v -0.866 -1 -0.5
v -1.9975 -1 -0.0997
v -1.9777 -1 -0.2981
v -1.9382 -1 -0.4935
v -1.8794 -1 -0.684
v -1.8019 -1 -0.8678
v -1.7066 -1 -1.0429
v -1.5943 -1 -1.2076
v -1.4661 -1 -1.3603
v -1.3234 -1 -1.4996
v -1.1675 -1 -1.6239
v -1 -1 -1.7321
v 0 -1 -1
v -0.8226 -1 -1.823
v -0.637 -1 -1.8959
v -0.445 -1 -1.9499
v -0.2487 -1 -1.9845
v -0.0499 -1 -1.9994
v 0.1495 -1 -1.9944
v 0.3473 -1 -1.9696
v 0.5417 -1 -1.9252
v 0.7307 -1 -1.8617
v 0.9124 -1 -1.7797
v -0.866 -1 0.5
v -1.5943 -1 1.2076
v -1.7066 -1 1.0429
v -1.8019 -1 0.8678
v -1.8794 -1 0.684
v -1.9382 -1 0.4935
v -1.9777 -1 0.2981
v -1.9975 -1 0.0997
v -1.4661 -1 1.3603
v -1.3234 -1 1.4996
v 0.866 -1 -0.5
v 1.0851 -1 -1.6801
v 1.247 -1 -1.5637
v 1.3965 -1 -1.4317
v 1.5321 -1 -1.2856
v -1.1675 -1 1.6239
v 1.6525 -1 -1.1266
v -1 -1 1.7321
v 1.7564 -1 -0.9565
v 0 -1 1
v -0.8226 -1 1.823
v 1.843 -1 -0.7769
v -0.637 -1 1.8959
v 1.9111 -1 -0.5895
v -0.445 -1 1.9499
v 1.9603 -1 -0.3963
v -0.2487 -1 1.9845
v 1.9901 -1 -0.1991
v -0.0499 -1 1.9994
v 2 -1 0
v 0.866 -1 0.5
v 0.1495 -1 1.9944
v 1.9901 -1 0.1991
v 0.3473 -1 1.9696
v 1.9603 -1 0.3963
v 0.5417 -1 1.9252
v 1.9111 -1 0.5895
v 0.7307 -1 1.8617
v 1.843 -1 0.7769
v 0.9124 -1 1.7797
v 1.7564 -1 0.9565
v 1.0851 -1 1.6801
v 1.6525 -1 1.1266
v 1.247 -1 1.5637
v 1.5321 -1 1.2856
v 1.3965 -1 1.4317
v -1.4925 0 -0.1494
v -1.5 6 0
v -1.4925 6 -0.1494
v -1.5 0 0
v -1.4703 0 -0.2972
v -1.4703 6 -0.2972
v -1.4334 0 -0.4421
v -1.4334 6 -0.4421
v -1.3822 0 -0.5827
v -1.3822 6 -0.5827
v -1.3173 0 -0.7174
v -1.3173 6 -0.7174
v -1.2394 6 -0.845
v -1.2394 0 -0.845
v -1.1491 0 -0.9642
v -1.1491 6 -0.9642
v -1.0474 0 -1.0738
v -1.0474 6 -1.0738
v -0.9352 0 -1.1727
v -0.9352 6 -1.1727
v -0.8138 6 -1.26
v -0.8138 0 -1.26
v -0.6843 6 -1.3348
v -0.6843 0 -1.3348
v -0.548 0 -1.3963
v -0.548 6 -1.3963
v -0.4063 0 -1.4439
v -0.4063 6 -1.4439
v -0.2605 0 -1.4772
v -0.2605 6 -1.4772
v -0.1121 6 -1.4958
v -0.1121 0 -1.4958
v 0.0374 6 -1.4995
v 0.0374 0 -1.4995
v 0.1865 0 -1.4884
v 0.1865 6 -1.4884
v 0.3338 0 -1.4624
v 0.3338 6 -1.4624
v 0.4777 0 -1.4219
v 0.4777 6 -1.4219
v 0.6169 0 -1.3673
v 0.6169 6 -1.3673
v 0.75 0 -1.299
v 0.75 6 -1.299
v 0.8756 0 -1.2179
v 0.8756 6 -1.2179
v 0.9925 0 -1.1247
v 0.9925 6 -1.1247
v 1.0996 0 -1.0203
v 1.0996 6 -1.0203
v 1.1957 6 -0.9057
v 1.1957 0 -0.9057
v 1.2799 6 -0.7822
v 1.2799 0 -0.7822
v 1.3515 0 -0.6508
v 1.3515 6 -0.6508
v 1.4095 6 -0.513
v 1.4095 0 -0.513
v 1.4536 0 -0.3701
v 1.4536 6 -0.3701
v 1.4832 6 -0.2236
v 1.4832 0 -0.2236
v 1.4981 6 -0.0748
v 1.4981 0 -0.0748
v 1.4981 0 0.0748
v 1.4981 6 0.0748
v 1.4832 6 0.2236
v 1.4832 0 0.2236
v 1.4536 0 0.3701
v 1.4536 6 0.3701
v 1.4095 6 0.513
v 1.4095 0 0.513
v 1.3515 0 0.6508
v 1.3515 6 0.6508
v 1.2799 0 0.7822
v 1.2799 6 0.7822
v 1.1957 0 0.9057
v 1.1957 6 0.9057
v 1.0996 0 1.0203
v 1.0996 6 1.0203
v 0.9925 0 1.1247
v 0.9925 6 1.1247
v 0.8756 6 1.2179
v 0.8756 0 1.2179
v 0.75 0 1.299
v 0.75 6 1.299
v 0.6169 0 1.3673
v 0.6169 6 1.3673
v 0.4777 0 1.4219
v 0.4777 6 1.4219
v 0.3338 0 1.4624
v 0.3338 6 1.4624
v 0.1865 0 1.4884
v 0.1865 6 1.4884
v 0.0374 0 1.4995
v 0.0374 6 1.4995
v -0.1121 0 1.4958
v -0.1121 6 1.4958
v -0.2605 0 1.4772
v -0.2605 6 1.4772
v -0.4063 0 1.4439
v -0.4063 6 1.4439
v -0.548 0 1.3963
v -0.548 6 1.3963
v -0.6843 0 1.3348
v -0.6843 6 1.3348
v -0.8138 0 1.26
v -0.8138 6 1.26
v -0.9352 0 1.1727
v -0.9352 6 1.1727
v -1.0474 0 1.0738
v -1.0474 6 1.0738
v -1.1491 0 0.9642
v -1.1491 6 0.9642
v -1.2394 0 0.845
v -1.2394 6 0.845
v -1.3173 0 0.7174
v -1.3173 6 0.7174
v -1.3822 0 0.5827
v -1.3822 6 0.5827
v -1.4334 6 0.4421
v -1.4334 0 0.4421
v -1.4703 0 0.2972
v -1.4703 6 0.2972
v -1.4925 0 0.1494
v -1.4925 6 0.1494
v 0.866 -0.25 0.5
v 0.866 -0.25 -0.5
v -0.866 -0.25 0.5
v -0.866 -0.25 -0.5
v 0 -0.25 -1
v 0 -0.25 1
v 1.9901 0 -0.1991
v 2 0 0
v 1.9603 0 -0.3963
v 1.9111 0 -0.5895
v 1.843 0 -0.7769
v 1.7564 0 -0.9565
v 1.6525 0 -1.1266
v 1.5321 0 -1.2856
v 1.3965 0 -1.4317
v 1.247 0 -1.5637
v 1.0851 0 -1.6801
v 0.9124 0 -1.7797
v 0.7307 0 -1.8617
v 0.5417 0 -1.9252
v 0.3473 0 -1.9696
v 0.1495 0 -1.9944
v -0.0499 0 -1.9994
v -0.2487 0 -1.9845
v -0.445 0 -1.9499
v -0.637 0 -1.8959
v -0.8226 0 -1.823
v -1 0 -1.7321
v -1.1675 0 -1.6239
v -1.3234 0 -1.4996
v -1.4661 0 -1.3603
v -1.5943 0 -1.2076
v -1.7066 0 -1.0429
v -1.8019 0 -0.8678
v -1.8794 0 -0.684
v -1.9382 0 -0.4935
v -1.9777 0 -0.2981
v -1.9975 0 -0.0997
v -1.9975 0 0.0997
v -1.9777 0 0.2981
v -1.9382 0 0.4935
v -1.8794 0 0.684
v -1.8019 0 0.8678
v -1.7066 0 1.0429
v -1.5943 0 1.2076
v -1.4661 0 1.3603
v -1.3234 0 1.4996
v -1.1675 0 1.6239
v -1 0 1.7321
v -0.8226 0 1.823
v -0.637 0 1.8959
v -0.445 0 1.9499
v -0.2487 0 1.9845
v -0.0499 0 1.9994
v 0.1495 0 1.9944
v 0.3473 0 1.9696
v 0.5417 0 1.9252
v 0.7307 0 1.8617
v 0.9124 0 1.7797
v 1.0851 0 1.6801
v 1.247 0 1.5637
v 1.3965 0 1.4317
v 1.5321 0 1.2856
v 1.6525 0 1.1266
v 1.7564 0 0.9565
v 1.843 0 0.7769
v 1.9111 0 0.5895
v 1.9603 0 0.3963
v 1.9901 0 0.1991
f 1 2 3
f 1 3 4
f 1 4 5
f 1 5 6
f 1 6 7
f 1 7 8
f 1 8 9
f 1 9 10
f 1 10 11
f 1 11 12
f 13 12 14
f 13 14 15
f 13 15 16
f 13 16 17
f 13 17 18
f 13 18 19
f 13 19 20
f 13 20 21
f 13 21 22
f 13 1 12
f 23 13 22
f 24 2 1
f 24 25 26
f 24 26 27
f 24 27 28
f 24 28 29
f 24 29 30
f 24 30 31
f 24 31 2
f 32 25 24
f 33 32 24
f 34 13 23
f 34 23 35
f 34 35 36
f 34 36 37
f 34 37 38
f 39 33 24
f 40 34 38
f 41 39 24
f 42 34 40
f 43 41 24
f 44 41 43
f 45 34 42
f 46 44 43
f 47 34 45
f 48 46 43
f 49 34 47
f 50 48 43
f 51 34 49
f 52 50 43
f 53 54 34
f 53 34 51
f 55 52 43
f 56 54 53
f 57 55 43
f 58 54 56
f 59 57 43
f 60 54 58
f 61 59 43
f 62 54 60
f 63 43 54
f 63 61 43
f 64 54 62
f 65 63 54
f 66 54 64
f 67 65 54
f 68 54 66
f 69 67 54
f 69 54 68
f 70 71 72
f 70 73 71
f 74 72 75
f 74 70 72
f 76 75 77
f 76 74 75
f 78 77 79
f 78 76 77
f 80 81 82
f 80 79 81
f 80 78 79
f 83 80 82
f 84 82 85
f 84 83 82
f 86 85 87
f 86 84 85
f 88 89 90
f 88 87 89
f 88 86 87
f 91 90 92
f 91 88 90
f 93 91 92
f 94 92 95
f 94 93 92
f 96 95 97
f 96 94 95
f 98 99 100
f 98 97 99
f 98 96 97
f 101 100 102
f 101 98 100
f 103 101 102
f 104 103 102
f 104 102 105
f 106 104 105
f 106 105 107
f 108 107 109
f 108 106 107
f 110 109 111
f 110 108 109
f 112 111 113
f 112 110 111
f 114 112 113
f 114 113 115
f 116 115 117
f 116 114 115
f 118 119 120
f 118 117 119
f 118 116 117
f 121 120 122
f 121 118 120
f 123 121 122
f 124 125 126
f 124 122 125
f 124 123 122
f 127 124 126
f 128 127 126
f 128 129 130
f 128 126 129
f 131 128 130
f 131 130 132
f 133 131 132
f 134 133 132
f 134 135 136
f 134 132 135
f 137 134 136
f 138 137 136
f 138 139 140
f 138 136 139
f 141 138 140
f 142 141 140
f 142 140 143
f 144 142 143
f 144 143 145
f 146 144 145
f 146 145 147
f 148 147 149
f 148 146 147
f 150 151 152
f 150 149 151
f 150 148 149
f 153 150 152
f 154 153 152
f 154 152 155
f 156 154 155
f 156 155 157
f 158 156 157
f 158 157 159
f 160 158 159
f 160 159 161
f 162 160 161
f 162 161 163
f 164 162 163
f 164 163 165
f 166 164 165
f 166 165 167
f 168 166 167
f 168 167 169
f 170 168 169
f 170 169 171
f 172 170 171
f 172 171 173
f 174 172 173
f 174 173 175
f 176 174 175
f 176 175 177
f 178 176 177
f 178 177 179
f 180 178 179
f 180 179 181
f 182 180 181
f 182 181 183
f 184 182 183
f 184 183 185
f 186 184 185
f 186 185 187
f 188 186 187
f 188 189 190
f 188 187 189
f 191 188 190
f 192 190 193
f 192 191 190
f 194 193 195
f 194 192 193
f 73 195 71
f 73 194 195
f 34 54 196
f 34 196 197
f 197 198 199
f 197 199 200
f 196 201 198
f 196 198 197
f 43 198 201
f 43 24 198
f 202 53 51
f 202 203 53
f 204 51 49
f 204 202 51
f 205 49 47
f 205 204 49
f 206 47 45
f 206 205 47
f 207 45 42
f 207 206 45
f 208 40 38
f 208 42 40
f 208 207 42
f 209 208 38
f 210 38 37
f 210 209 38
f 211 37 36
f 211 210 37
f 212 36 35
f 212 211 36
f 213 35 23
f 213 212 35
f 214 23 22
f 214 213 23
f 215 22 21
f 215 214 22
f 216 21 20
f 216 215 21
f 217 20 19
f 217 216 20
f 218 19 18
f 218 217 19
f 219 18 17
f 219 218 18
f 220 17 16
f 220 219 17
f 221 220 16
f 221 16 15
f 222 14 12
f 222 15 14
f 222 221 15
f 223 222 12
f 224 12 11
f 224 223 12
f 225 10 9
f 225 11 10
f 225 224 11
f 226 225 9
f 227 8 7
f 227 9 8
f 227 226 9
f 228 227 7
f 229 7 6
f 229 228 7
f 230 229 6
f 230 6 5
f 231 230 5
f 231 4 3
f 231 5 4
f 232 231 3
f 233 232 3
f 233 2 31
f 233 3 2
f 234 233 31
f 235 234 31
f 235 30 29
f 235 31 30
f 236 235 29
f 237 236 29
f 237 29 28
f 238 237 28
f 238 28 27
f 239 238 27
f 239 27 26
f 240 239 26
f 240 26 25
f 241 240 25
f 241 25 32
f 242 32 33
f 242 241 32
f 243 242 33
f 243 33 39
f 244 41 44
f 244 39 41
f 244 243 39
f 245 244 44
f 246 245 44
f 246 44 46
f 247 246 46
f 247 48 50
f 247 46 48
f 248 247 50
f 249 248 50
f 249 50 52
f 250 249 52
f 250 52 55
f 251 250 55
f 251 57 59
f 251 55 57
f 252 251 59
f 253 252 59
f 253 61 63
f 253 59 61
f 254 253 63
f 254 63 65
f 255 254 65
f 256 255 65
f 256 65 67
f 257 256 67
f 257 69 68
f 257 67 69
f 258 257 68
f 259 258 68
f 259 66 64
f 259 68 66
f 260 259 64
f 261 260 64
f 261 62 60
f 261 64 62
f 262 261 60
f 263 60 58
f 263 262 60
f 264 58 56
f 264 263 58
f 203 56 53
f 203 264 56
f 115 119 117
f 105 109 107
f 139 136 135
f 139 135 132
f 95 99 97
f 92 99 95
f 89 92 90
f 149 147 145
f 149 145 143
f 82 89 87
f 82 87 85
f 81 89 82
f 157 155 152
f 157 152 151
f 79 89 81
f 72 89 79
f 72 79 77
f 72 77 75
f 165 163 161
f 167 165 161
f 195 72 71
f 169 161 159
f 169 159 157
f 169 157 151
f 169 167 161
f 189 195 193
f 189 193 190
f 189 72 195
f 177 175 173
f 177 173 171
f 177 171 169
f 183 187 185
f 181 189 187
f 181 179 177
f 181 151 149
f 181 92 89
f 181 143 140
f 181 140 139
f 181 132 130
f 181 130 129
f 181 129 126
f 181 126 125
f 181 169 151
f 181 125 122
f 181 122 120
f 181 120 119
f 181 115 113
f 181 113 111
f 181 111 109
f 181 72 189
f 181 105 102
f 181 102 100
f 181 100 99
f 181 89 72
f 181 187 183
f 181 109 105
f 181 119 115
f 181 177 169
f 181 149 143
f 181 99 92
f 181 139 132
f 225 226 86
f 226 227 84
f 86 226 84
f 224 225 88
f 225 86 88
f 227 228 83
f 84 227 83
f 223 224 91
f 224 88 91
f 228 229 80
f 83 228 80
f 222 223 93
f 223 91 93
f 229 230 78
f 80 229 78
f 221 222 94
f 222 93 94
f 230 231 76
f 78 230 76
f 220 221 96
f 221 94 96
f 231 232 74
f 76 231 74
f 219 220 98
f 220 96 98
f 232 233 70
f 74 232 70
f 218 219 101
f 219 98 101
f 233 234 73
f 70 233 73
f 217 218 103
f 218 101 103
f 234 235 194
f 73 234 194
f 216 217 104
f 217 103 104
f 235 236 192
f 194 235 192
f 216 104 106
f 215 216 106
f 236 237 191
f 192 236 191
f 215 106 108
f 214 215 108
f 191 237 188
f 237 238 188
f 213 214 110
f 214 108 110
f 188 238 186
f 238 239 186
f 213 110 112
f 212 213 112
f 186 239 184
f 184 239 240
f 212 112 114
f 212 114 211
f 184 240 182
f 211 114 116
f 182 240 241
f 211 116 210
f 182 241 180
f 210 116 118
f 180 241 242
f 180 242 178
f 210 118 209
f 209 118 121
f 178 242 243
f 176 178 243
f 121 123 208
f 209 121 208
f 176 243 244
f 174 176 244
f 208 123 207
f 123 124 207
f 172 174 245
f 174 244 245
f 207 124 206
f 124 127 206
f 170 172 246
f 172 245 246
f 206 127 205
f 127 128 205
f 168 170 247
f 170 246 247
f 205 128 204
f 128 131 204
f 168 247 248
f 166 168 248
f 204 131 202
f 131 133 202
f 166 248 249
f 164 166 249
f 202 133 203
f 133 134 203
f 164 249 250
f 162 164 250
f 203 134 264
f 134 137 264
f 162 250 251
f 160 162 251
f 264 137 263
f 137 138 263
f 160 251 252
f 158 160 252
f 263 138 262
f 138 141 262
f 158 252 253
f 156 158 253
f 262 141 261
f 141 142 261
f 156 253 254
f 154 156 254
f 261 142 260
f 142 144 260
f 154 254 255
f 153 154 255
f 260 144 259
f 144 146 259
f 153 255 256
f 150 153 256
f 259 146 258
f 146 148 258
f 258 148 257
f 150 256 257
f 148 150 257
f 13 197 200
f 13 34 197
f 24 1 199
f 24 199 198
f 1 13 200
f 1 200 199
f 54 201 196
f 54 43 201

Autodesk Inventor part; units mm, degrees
ref_plane "YZ Plane" through (0, 0, 0) normal (1, 0, 0) x (0, 1, 0)
ref_plane "XZ Plane" through (0, 0, 0) normal (0, 1, 0) x (-1, 0, 0)
ref_plane "XY Plane" through (0, 0, 0) normal (0, 0, 1) x (1, 0, 0)
sketch "Sketch1" plane through (0, 0, 0) normal (0, 1, 0) x (-1, 0, 0)
  circle A0 centre (0, 0) radius 1.5
  dimension "d0" = 3
extrude "Extrusion1" add sketch "Sketch1" along normal blind 6
thread "Thread1" size "M3x0.5" class "6g" standard "ANSI Metric M Profile" length 6
sketch "Sketch2" plane through (0, 0, 0) normal (0, -1, 0) x (1, 0, 0)
  circle A0 centre (0, 0) radius 2
  dimension "d5" = 4
extrude "Extrusion2" add sketch "Sketch2" along normal blind 1
sketch "Sketch3" plane through (0, -1, 0) normal (0, -1, 0) x (1, 0, 0)
  circle A0 centre (0, 0) radius 1.5 projected
  line L0 (0, 0) -> (0, 1)
  line L1 (0, 1) -> (0.866, 0.5)
  line L2 (0.866, 0.5) -> (0.866, -0.5)
  line L3 (0.866, -0.5) -> (0, -1)
  line L4 (0, -1) -> (-0.866, -0.5)
  line L5 (-0.866, -0.5) -> (-0.866, 0.5)
  line L6 (-0.866, 0.5) -> (0, 1)
  dimension "d8" = 1
extrude "Extrusion3" cut sketch "Sketch3" against normal blind 0.75 contours L1 L2 L3 L4 L5 L6
properties part number "Connector_2" material "Steel, Mild"
